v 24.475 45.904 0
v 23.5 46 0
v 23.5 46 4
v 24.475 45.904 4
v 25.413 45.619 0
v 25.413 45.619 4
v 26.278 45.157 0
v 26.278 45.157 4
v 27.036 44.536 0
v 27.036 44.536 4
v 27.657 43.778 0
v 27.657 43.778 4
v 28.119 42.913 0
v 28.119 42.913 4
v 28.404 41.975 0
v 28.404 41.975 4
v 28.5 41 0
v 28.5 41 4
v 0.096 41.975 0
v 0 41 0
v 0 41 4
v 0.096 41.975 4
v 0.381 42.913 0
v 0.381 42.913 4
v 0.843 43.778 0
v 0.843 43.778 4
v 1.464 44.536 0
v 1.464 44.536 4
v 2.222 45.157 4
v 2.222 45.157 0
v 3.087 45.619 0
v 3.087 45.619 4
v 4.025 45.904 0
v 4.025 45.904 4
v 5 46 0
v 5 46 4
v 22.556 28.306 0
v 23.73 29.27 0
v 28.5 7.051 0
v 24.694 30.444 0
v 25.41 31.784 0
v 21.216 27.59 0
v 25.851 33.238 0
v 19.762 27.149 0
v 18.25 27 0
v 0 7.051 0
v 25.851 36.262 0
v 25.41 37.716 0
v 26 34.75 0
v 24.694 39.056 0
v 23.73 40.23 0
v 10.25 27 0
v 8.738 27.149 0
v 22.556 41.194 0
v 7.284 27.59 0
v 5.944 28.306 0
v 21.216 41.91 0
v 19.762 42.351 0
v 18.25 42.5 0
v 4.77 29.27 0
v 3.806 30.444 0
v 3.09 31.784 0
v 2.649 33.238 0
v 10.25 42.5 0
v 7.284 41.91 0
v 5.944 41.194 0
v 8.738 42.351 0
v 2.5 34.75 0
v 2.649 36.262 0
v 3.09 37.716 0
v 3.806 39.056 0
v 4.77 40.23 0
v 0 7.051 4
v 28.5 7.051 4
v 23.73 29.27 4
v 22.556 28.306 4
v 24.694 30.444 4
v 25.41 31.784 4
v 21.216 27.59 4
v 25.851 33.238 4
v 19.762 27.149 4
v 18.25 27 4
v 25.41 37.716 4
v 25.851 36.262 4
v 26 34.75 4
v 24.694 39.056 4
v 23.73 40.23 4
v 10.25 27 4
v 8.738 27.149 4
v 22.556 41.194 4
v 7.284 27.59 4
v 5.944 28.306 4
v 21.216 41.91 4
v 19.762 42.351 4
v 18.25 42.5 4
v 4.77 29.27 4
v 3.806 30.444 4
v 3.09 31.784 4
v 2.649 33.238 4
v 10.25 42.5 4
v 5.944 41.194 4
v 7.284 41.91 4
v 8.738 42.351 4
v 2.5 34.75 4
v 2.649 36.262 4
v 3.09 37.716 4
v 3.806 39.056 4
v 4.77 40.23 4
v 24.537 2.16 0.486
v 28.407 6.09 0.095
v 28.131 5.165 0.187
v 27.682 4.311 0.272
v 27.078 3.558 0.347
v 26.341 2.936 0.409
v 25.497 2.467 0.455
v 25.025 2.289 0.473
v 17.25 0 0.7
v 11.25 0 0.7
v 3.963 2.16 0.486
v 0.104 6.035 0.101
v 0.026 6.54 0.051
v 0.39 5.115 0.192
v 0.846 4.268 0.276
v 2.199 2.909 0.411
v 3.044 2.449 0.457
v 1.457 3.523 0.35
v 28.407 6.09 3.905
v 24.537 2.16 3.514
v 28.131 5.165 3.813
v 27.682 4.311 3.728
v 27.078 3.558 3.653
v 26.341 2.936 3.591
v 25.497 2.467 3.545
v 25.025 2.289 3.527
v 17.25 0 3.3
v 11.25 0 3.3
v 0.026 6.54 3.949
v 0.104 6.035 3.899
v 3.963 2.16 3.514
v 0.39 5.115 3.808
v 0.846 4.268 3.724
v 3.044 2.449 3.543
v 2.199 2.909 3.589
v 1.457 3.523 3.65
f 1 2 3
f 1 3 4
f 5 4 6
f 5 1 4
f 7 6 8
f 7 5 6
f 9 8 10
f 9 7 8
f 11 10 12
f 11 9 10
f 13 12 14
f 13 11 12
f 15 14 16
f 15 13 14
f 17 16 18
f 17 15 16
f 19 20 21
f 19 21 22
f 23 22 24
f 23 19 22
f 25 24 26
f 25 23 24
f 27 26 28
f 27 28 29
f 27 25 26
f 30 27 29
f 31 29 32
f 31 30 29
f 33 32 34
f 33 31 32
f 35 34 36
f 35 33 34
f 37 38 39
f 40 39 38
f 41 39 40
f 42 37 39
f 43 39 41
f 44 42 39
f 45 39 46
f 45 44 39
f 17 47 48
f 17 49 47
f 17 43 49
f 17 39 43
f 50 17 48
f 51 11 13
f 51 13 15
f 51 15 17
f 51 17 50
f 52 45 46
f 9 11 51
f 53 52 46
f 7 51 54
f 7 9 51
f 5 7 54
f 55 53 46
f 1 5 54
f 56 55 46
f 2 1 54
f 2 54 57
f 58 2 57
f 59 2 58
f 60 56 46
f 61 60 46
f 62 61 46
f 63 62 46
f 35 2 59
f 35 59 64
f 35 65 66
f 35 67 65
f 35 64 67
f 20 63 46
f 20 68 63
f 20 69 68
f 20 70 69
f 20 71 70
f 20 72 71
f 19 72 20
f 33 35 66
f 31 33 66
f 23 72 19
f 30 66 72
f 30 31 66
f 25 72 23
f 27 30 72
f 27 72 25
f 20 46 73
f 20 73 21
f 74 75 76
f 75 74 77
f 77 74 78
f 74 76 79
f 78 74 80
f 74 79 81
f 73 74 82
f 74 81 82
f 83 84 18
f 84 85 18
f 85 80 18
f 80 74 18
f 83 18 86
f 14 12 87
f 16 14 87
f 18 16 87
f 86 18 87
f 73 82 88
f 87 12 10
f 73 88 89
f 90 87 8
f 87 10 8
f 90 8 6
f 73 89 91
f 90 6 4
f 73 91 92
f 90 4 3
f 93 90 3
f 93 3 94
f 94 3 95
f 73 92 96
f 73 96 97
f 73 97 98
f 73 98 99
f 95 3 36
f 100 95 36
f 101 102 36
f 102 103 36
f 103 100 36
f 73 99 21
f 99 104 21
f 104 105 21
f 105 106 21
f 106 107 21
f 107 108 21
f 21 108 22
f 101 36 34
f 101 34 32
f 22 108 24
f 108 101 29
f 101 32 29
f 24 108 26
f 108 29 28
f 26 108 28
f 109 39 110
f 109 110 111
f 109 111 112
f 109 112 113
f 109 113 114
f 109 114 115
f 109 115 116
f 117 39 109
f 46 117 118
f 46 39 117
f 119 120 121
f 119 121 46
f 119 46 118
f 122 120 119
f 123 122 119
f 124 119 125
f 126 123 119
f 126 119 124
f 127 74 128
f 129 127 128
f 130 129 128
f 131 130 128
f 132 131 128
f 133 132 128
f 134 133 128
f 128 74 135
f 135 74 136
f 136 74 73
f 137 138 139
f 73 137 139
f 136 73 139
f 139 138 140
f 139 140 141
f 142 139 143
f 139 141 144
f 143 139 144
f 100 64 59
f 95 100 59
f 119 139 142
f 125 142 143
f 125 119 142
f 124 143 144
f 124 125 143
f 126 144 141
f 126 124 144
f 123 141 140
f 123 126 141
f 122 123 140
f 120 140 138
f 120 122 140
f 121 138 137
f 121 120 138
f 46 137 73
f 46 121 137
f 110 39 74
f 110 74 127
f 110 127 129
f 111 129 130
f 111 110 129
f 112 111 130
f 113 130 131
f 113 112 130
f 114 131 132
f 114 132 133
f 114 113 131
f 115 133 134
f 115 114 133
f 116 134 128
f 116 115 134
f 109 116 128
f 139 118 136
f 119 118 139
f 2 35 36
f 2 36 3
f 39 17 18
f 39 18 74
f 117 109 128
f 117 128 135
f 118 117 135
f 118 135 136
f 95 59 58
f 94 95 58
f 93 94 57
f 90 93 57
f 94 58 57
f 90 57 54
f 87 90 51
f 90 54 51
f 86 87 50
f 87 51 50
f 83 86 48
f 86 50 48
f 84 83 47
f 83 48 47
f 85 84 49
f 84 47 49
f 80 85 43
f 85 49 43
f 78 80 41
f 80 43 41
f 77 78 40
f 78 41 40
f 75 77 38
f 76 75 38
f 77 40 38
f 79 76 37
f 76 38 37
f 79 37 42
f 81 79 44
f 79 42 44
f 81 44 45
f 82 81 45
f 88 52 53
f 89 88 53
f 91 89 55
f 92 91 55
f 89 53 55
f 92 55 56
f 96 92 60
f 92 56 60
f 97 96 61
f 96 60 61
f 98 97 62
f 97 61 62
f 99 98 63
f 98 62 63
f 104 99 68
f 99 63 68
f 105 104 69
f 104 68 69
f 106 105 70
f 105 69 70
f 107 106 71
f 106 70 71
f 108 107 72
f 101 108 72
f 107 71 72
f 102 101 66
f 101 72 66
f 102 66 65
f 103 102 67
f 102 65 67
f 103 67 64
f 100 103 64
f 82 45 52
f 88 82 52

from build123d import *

# Parameters (mm, degrees)
BOSS_EXTRUDE1_DEPTH = 4
CUT_EXTRUDE1_DEPTH  = 55.260943597


with BuildPart() as part:
    # Sketch1 → Boss-Extrude1 (new body)
    with BuildSketch(Plane.XY):
        with BuildLine():
            Line((0, 7.050779416), (0, 41))
            ThreePointArc((0, 41), (1.464466094, 44.535533906), (5, 46))
            Line((5, 46), (23.5, 46))
            ThreePointArc((23.5, 46), (27.035533906, 44.535533906), (28.5, 41))
            Line((28.5, 41), (28.5, 7.050779416))
            ThreePointArc((28.5, 7.050779416), (27.385023171, 3.903305038), (24.537362015, 2.159575061))
            Line((24.537362015, 2.159575061), (17.25, 0))
            Line((17.25, 0), (11.25, 0))
            Line((11.25, 0), (3.962637985, 2.159575061))
            ThreePointArc((3.962637985, 2.159575061), (1.114976829, 3.903305038), (0, 7.050779416))
        make_face()
        with BuildLine():
            Line((10.25, 42.5), (18.25, 42.5))
            ThreePointArc((18.25, 42.5), (26, 34.75), (18.25, 27))
            Line((18.25, 27), (10.25, 27))
            ThreePointArc((10.25, 27), (2.5, 34.75), (10.25, 42.5))
        make_face(mode=Mode.SUBTRACT)
    extrude(amount=BOSS_EXTRUDE1_DEPTH)

    # Sketch2 → Cut-Extrude1 (cut, through all)
    with BuildSketch(Plane.ZY):
        Polygon((0, 0), (0, 7.050779416), (0.7, 0), align=None)
        Polygon((4, 7.050779416), (3.3, 0), (4, 0), align=None)
    extrude(amount=-CUT_EXTRUDE1_DEPTH, mode=Mode.SUBTRACT)


solid = part.part
